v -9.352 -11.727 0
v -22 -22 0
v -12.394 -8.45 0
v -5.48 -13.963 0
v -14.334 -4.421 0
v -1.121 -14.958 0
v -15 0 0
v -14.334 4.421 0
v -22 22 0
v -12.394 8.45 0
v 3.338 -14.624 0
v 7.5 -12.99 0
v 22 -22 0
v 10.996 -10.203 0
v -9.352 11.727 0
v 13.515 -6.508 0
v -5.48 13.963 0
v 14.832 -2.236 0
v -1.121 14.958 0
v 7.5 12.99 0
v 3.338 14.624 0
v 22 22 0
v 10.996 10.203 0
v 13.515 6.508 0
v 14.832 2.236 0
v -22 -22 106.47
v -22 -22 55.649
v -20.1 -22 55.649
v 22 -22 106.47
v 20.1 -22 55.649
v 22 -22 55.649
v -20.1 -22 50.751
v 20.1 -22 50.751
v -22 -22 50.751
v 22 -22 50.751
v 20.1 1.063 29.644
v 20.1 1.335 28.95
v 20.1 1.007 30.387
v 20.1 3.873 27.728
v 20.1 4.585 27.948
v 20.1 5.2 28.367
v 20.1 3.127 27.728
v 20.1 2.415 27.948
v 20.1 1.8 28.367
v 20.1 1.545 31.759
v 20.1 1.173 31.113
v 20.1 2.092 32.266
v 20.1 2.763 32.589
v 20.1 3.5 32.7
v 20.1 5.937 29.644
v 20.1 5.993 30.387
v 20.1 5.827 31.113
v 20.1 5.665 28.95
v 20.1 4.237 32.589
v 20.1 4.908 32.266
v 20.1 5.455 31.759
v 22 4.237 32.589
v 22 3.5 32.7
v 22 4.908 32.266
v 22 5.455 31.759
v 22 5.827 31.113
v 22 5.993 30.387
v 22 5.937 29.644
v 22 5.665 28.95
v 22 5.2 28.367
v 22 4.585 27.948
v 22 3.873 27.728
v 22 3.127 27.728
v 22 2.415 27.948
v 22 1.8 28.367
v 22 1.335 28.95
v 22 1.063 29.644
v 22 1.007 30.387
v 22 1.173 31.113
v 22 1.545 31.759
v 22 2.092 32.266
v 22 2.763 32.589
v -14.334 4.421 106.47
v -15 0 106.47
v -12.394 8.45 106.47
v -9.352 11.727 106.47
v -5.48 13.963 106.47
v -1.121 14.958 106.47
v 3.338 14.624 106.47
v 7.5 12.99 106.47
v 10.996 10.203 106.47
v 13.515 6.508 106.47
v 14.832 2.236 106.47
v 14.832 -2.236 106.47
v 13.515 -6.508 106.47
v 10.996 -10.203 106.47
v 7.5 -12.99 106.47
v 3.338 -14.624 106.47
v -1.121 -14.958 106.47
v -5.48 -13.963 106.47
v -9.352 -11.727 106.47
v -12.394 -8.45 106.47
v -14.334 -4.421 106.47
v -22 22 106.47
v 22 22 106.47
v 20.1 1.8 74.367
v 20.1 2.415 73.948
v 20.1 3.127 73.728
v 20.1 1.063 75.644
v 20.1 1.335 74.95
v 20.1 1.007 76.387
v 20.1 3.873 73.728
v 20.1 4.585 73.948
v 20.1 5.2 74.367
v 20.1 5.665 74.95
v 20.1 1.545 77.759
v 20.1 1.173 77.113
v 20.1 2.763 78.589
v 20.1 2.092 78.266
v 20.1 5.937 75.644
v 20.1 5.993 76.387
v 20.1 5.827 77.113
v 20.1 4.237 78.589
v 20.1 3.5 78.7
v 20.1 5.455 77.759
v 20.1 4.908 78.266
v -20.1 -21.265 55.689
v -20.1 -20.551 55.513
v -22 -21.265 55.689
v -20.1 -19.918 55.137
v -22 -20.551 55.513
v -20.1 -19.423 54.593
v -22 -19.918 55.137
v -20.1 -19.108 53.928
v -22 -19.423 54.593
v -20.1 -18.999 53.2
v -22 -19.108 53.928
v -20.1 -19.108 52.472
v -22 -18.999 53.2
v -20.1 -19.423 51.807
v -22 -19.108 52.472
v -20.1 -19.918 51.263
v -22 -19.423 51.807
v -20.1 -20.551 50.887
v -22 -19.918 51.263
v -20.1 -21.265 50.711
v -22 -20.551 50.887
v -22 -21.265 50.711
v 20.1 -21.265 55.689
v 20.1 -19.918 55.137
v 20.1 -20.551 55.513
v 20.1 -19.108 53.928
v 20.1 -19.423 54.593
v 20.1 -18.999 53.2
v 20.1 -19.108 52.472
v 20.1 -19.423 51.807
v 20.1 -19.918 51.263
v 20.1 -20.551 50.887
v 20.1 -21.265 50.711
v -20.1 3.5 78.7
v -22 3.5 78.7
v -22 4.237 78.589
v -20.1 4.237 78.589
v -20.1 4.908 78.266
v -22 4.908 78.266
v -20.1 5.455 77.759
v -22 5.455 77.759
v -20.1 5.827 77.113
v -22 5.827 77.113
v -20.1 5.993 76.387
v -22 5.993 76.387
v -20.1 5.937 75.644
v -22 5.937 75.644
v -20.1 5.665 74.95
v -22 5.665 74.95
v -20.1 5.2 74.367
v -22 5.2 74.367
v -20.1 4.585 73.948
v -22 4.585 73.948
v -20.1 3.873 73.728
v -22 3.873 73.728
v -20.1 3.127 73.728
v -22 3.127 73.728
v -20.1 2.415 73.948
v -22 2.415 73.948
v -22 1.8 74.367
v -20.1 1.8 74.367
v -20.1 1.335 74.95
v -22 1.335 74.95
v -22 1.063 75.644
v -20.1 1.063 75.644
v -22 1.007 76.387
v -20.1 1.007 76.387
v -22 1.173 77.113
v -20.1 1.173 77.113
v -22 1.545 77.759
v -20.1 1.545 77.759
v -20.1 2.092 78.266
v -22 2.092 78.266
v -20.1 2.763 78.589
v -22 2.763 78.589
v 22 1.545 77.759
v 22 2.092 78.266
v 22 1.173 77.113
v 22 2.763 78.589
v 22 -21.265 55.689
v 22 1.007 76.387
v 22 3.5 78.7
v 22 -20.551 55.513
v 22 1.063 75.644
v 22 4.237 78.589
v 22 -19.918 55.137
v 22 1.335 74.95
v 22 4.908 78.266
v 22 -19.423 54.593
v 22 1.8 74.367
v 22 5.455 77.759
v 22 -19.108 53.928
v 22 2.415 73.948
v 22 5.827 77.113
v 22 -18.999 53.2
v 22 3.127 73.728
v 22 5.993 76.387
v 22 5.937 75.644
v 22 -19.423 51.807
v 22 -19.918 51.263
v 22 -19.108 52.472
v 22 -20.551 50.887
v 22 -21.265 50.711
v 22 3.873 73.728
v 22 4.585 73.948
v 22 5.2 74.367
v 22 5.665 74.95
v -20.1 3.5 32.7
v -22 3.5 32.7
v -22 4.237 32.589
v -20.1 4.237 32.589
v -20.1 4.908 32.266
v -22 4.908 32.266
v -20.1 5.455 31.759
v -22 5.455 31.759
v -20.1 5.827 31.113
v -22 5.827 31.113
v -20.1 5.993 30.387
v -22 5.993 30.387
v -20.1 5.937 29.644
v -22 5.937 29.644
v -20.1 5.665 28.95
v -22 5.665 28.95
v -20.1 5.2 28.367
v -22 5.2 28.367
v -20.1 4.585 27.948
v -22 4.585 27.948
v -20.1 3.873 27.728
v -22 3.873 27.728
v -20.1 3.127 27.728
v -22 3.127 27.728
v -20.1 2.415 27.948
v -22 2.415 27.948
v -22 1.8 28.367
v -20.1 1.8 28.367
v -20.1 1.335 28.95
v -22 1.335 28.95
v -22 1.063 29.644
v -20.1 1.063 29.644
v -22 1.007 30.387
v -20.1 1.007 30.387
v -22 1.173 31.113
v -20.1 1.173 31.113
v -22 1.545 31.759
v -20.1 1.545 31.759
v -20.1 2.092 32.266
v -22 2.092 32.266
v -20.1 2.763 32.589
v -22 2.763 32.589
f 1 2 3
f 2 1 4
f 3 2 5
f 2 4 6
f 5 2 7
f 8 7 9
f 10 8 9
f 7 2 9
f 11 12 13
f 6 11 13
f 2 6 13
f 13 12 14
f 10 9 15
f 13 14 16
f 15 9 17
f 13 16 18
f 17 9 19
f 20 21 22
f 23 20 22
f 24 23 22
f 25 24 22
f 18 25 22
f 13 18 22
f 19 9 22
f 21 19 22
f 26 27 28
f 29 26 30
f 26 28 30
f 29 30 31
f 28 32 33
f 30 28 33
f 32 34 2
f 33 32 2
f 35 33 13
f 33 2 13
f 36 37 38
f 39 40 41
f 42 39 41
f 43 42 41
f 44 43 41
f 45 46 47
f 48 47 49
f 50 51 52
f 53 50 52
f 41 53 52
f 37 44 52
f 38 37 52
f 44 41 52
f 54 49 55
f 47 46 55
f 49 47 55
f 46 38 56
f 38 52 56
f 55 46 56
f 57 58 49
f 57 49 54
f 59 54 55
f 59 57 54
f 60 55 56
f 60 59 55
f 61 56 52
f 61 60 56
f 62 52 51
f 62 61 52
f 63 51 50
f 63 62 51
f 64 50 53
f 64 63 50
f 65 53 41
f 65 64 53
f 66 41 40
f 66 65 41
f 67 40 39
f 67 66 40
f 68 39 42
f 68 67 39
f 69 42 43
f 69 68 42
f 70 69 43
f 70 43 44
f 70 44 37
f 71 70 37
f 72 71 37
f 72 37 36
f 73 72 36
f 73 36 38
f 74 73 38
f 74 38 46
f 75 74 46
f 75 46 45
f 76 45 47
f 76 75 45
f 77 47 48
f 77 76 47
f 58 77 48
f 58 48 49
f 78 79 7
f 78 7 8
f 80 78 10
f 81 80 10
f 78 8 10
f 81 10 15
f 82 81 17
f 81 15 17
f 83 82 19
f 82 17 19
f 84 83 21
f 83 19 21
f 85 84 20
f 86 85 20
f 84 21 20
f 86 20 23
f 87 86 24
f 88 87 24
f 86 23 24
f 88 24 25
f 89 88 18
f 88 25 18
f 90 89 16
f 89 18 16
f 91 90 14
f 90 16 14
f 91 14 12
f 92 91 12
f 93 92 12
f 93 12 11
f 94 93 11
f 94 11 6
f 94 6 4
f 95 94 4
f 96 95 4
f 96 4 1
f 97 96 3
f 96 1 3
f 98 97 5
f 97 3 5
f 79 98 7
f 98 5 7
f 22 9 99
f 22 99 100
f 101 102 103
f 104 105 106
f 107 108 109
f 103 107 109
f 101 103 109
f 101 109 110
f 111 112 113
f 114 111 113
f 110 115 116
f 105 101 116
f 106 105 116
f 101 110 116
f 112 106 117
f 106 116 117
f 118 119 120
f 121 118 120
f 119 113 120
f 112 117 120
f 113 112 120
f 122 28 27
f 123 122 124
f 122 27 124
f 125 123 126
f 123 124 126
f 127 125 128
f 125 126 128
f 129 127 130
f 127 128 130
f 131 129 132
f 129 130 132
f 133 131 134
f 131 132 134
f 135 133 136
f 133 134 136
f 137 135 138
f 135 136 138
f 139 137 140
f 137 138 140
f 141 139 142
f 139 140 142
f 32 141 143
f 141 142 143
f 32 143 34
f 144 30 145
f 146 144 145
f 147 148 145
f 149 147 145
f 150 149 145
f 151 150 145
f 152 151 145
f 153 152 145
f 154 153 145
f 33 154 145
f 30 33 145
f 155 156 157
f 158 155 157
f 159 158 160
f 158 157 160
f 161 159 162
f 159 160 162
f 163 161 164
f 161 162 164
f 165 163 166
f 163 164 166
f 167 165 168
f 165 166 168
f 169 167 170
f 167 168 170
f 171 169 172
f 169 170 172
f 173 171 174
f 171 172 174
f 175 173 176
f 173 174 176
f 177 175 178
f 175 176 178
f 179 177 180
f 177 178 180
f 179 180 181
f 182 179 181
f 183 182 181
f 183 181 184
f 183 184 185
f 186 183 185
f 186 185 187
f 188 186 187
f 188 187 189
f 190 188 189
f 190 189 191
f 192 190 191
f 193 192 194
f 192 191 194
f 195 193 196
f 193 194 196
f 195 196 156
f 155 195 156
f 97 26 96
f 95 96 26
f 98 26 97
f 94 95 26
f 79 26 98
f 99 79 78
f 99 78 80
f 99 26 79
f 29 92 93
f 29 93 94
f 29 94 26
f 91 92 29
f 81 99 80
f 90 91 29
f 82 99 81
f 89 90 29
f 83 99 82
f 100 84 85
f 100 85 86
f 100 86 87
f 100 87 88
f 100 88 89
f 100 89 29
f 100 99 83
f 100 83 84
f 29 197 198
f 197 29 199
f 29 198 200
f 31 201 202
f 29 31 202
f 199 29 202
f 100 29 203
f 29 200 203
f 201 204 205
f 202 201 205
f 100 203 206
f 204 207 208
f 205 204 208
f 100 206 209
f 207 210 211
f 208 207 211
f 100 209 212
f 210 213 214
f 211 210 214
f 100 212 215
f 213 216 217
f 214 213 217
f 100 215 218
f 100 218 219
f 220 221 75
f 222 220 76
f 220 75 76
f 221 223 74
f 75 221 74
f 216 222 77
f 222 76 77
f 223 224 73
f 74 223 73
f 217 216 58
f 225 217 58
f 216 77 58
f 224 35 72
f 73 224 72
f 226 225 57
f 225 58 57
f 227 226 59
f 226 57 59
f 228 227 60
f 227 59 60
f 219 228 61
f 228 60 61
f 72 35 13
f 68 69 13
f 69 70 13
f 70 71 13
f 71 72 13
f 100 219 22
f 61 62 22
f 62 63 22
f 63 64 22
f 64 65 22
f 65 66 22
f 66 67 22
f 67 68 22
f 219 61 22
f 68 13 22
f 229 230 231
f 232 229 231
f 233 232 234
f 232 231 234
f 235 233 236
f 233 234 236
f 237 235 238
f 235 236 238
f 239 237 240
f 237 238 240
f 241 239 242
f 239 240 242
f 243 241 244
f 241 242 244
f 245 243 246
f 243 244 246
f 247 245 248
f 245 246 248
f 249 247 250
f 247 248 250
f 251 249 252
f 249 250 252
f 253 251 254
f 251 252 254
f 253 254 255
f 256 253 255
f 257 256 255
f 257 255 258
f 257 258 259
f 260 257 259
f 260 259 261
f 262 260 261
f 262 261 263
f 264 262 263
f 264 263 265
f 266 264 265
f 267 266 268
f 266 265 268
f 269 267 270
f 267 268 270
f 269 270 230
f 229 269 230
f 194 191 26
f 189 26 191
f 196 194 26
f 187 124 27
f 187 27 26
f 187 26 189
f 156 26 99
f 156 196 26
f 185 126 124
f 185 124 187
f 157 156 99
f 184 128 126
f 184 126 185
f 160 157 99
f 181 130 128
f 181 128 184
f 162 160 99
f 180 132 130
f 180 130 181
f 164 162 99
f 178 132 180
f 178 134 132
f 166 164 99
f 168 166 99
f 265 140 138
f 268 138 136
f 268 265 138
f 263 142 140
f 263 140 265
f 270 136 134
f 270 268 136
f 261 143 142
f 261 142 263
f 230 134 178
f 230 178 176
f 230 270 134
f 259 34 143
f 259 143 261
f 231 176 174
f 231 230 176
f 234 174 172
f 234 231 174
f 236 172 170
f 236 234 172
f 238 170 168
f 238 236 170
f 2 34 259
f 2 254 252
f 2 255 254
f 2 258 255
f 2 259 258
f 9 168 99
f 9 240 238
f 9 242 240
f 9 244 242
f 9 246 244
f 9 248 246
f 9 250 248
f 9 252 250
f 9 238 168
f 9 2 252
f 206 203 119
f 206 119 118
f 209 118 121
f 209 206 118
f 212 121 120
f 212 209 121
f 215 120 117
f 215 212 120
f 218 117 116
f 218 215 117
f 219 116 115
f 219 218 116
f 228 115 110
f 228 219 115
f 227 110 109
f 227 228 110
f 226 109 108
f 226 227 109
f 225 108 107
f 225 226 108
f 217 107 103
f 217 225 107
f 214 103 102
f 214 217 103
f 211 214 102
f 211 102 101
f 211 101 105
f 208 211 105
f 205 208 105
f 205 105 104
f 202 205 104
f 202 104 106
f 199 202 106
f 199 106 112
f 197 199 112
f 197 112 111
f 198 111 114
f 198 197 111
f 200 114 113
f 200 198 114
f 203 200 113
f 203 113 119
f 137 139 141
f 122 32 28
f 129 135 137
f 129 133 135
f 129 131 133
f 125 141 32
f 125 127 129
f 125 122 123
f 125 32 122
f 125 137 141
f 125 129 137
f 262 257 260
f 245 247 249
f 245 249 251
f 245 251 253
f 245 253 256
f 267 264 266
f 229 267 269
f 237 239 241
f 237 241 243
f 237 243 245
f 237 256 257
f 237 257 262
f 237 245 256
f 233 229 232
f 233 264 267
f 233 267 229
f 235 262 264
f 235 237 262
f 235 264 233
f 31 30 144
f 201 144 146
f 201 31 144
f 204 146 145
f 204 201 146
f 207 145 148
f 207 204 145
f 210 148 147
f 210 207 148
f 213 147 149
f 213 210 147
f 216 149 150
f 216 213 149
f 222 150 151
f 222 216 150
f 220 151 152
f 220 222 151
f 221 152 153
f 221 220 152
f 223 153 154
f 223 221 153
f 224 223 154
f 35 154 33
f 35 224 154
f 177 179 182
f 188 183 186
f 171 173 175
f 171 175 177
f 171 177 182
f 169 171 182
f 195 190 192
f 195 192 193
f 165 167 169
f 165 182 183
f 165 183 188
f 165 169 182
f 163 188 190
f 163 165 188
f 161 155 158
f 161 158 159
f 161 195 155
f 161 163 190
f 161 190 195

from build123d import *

# Parameters (mm, degrees)
SKETCH1_W           = 44
SKETCH1_H           = 44
BOSS_EXTRUDE1_DEPTH = 106.47
SKETCH5_R           = 15
CUT_EXTRUDE2_DEPTH  = 106.47
SKETCH10_R          = 2.5
CUT_EXTRUDE9_DEPTH  = 1.9


with BuildPart() as part:
    # Sketch1 → Boss-Extrude1 (new body)
    with BuildSketch(Plane.XY):
        Rectangle(SKETCH1_W, SKETCH1_H)
    extrude(amount=BOSS_EXTRUDE1_DEPTH)

    # Sketch5 → Cut-Extrude2 (cut)
    with BuildSketch(Plane(origin=(0, 0, 0), x_dir=(-1, 0, 0), z_dir=(0, 0, -1))):
        Circle(SKETCH5_R)
    extrude(amount=-CUT_EXTRUDE2_DEPTH, mode=Mode.SUBTRACT)

    # Sketch10 → Cut-Extrude9 (cut)
    with BuildSketch(Plane.ZY.offset(22)):
        with Locations((30.2, 3.5)):
            Circle(SKETCH10_R)
        with Locations((76.2, 3.5)):
            Circle(SKETCH10_R)
        with Locations((53.2, -21.499217988)):
            Circle(SKETCH10_R)
    cut_extrude9 = extrude(amount=-CUT_EXTRUDE9_DEPTH, mode=Mode.SUBTRACT)

    # Mirror1: Cut-Extrude9 across plane
    add(cut_extrude9.mirror(Plane(origin=(0, 0, 0), x_dir=(0, 0, 1), z_dir=(1, 0, 0))), mode=Mode.SUBTRACT)


solid = part.part
